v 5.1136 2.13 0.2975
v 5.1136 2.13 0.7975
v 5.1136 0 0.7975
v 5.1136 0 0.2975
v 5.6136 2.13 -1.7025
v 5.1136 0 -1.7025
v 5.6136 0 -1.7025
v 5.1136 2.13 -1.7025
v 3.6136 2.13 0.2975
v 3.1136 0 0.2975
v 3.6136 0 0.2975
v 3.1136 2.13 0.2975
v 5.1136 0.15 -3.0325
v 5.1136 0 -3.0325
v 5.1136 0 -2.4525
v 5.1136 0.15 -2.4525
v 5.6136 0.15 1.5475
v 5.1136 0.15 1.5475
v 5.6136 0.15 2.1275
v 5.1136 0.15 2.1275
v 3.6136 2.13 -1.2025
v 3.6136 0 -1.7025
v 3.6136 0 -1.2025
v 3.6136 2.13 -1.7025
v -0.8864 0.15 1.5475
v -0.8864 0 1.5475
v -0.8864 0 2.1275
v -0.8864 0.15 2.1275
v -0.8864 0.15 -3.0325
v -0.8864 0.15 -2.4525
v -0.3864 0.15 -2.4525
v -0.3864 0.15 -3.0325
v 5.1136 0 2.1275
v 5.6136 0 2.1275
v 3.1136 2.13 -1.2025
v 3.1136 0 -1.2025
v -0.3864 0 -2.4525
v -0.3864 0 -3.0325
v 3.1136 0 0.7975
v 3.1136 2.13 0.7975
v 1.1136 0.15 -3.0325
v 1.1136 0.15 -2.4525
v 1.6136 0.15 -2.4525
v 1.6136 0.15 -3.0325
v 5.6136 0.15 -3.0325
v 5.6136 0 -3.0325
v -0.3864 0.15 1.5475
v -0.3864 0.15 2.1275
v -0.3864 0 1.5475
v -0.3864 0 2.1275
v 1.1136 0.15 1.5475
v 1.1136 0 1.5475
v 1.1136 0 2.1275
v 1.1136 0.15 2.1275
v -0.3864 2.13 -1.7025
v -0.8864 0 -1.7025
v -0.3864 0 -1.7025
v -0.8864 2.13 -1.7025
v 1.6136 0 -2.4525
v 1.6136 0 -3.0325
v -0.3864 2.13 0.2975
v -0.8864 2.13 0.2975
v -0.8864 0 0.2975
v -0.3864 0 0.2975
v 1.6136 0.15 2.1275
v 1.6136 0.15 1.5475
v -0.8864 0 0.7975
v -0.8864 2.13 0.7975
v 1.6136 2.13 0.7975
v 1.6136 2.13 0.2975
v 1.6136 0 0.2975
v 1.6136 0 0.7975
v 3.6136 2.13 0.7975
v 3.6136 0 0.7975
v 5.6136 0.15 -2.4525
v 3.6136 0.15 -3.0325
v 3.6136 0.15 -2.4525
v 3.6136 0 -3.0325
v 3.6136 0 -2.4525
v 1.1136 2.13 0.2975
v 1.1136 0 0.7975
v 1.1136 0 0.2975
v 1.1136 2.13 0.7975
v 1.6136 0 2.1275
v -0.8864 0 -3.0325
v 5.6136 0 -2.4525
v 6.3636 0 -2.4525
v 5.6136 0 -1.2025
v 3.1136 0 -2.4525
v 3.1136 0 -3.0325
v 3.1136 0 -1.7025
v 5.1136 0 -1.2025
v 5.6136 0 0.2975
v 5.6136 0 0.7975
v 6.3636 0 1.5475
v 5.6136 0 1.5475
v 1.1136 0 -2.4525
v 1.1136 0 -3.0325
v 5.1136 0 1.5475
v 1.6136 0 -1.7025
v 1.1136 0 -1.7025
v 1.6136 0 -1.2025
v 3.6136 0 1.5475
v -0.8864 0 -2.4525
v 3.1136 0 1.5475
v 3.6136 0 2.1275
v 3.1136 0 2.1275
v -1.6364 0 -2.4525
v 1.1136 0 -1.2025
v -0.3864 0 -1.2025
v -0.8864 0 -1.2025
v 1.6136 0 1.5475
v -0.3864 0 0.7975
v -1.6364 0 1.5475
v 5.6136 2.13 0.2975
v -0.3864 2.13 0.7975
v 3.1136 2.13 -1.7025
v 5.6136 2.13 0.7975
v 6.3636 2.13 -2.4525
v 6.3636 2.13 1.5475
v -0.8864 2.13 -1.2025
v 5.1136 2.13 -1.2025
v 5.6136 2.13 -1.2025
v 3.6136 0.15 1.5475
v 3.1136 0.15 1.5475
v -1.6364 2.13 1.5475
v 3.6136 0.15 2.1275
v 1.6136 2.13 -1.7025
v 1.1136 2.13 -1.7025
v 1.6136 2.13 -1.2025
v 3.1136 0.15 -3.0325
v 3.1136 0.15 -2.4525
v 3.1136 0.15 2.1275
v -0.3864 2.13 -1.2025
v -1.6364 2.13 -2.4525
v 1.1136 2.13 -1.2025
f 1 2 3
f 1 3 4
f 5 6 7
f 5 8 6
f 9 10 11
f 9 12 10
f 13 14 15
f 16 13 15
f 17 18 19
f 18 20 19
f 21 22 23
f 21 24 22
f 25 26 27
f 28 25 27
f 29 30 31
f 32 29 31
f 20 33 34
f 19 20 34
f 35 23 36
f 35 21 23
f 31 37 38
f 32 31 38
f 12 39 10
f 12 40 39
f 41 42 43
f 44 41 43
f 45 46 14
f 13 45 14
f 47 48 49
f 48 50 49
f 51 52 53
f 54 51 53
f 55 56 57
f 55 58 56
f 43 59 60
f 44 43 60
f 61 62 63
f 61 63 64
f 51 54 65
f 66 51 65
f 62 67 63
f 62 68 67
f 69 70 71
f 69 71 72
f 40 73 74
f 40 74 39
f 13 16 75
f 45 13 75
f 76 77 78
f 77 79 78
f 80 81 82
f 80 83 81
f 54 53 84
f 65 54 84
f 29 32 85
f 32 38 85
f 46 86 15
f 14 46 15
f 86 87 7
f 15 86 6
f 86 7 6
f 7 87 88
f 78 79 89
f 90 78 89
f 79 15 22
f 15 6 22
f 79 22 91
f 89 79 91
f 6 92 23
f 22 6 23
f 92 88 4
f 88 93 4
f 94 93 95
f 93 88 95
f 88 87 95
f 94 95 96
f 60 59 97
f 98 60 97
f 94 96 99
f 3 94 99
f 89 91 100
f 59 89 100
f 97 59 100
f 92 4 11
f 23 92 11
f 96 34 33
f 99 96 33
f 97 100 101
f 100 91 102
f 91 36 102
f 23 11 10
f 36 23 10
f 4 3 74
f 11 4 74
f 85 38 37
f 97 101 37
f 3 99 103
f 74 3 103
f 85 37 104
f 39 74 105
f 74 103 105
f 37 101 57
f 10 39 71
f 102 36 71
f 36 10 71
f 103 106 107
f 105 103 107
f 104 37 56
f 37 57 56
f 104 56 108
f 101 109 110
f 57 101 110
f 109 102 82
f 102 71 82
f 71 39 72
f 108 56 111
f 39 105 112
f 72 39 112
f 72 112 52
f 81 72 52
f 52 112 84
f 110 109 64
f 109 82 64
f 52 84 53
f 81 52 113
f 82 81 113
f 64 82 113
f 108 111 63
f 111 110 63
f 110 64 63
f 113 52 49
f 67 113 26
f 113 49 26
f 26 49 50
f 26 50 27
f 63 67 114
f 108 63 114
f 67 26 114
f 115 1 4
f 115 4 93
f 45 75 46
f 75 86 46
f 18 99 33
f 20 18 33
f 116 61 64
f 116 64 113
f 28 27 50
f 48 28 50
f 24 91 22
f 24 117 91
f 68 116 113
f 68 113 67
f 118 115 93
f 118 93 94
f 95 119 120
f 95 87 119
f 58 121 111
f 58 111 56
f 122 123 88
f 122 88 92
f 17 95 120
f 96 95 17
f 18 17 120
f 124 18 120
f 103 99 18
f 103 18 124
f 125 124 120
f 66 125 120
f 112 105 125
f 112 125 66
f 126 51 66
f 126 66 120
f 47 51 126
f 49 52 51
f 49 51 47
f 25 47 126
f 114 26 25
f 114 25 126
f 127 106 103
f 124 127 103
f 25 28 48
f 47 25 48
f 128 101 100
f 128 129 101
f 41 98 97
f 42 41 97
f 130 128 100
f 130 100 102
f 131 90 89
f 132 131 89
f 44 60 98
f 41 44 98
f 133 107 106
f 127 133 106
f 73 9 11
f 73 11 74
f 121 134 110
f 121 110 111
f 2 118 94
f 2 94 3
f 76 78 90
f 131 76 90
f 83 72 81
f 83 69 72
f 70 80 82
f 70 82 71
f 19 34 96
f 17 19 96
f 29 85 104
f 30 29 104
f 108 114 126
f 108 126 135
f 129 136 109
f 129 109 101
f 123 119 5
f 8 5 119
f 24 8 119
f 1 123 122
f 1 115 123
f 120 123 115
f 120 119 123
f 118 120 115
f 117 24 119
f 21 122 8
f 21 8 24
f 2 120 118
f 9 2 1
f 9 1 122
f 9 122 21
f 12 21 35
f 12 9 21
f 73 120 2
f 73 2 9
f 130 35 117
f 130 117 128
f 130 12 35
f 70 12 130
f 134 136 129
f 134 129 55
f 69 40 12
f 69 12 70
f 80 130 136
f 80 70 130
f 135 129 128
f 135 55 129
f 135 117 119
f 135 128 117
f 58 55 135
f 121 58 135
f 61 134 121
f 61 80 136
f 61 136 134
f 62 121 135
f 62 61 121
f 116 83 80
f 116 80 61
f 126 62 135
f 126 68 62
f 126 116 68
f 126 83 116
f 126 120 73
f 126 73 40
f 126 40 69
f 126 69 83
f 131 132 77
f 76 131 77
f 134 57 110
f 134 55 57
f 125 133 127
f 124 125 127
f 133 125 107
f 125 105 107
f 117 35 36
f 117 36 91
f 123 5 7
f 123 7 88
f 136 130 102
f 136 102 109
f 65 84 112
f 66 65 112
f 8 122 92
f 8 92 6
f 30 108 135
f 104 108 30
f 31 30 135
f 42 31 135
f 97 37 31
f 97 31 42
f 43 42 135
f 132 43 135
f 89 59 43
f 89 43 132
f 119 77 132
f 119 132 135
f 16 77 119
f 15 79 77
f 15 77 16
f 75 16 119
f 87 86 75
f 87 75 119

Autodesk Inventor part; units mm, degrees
ref_plane "YZ Plane" through (0, 0, 0) normal (1, 0, 0) x (0, 1, 0)
ref_plane "XZ Plane" through (0, 0, 0) normal (0, 1, 0) x (-1, 0, 0)
ref_plane "XY Plane" through (0, 0, 0) normal (0, 0, 1) x (1, 0, 0)
sketch "Sketch1" plane through (0, 0, 0) normal (0, 1, 0) x (-1, 0, 0)
  line L0 (-6.3636, 1.5475) -> (1.6364, 1.5475)
  line L1 (1.6364, 1.5475) -> (1.6364, -2.4525)
  line L2 (1.6364, -2.4525) -> (-6.3636, -2.4525)
  line L3 (-6.3636, -2.4525) -> (-6.3636, 1.5475)
  point P0 (0, 0)
  dimension "d0" = 4
  dimension "d1" = 8
extrude "Extrusion1" add sketch "Sketch1" along normal blind 2.13
sketch "Sketch3" plane through (0, 0, 0) normal (0, -1, 0) x (1, 0, 0)
  line L0 (6.3636, 1.5475) -> (-1.6364, 1.5475) projected
  line L1 (-1.6364, 1.5475) -> (-1.6364, -2.4525) projected
  line L2 (-0.8864, 2.1275) -> (-0.3864, 2.1275)
  line L3 (-0.3864, 2.1275) -> (-0.3864, -3.0325)
  line L4 (-0.3864, -3.0325) -> (-0.8864, -3.0325)
  line L5 (-0.8864, -3.0325) -> (-0.8864, 2.1275)
  point P0 (0, 0)
  dimension "d4" = 0.5
  dimension "d5" = 5.16
  dimension "d6" = 0.58
  dimension "d7" = 0.75
extrude "Extrusion2" add sketch "Sketch3" against normal blind 0.15
pattern_linear "Rectangular Pattern1" count 4 spacing 2 along (1, 0, 0) of "Extrusion2"
sketch "Sketch4" plane through (0, 2.13, 0) normal (0, 1, 0) x (1, 0, 0)
  line L0 (6.3636, 2.4525) -> (-1.6364, 2.4525) projected
  line L1 (-1.6364, 2.4525) -> (-1.6364, -1.5475) projected
  line L2 (-0.8864, 1.7025) -> (-0.3864, 1.7025)
  line L3 (-0.3864, 1.7025) -> (-0.3864, 1.2025)
  line L4 (-0.3864, 1.2025) -> (-0.8864, 1.2025)
  line L5 (-0.8864, 1.2025) -> (-0.8864, 1.7025)
  point P0 (0, 0)
  dimension "d13" = 0.5
  dimension "d14" = 0.5
  dimension "d15" = 0.75
  dimension "d16" = 0.75
extrude "Extrusion3" cut sketch "Sketch4" against normal through all
pattern_linear "Rectangular Pattern2" count 4 spacing 2 along (1, 0, 0) count 2 spacing 2 along (0, 0, 1) of "Extrusion3"
properties part number "2mm2Row8PosFemale"
